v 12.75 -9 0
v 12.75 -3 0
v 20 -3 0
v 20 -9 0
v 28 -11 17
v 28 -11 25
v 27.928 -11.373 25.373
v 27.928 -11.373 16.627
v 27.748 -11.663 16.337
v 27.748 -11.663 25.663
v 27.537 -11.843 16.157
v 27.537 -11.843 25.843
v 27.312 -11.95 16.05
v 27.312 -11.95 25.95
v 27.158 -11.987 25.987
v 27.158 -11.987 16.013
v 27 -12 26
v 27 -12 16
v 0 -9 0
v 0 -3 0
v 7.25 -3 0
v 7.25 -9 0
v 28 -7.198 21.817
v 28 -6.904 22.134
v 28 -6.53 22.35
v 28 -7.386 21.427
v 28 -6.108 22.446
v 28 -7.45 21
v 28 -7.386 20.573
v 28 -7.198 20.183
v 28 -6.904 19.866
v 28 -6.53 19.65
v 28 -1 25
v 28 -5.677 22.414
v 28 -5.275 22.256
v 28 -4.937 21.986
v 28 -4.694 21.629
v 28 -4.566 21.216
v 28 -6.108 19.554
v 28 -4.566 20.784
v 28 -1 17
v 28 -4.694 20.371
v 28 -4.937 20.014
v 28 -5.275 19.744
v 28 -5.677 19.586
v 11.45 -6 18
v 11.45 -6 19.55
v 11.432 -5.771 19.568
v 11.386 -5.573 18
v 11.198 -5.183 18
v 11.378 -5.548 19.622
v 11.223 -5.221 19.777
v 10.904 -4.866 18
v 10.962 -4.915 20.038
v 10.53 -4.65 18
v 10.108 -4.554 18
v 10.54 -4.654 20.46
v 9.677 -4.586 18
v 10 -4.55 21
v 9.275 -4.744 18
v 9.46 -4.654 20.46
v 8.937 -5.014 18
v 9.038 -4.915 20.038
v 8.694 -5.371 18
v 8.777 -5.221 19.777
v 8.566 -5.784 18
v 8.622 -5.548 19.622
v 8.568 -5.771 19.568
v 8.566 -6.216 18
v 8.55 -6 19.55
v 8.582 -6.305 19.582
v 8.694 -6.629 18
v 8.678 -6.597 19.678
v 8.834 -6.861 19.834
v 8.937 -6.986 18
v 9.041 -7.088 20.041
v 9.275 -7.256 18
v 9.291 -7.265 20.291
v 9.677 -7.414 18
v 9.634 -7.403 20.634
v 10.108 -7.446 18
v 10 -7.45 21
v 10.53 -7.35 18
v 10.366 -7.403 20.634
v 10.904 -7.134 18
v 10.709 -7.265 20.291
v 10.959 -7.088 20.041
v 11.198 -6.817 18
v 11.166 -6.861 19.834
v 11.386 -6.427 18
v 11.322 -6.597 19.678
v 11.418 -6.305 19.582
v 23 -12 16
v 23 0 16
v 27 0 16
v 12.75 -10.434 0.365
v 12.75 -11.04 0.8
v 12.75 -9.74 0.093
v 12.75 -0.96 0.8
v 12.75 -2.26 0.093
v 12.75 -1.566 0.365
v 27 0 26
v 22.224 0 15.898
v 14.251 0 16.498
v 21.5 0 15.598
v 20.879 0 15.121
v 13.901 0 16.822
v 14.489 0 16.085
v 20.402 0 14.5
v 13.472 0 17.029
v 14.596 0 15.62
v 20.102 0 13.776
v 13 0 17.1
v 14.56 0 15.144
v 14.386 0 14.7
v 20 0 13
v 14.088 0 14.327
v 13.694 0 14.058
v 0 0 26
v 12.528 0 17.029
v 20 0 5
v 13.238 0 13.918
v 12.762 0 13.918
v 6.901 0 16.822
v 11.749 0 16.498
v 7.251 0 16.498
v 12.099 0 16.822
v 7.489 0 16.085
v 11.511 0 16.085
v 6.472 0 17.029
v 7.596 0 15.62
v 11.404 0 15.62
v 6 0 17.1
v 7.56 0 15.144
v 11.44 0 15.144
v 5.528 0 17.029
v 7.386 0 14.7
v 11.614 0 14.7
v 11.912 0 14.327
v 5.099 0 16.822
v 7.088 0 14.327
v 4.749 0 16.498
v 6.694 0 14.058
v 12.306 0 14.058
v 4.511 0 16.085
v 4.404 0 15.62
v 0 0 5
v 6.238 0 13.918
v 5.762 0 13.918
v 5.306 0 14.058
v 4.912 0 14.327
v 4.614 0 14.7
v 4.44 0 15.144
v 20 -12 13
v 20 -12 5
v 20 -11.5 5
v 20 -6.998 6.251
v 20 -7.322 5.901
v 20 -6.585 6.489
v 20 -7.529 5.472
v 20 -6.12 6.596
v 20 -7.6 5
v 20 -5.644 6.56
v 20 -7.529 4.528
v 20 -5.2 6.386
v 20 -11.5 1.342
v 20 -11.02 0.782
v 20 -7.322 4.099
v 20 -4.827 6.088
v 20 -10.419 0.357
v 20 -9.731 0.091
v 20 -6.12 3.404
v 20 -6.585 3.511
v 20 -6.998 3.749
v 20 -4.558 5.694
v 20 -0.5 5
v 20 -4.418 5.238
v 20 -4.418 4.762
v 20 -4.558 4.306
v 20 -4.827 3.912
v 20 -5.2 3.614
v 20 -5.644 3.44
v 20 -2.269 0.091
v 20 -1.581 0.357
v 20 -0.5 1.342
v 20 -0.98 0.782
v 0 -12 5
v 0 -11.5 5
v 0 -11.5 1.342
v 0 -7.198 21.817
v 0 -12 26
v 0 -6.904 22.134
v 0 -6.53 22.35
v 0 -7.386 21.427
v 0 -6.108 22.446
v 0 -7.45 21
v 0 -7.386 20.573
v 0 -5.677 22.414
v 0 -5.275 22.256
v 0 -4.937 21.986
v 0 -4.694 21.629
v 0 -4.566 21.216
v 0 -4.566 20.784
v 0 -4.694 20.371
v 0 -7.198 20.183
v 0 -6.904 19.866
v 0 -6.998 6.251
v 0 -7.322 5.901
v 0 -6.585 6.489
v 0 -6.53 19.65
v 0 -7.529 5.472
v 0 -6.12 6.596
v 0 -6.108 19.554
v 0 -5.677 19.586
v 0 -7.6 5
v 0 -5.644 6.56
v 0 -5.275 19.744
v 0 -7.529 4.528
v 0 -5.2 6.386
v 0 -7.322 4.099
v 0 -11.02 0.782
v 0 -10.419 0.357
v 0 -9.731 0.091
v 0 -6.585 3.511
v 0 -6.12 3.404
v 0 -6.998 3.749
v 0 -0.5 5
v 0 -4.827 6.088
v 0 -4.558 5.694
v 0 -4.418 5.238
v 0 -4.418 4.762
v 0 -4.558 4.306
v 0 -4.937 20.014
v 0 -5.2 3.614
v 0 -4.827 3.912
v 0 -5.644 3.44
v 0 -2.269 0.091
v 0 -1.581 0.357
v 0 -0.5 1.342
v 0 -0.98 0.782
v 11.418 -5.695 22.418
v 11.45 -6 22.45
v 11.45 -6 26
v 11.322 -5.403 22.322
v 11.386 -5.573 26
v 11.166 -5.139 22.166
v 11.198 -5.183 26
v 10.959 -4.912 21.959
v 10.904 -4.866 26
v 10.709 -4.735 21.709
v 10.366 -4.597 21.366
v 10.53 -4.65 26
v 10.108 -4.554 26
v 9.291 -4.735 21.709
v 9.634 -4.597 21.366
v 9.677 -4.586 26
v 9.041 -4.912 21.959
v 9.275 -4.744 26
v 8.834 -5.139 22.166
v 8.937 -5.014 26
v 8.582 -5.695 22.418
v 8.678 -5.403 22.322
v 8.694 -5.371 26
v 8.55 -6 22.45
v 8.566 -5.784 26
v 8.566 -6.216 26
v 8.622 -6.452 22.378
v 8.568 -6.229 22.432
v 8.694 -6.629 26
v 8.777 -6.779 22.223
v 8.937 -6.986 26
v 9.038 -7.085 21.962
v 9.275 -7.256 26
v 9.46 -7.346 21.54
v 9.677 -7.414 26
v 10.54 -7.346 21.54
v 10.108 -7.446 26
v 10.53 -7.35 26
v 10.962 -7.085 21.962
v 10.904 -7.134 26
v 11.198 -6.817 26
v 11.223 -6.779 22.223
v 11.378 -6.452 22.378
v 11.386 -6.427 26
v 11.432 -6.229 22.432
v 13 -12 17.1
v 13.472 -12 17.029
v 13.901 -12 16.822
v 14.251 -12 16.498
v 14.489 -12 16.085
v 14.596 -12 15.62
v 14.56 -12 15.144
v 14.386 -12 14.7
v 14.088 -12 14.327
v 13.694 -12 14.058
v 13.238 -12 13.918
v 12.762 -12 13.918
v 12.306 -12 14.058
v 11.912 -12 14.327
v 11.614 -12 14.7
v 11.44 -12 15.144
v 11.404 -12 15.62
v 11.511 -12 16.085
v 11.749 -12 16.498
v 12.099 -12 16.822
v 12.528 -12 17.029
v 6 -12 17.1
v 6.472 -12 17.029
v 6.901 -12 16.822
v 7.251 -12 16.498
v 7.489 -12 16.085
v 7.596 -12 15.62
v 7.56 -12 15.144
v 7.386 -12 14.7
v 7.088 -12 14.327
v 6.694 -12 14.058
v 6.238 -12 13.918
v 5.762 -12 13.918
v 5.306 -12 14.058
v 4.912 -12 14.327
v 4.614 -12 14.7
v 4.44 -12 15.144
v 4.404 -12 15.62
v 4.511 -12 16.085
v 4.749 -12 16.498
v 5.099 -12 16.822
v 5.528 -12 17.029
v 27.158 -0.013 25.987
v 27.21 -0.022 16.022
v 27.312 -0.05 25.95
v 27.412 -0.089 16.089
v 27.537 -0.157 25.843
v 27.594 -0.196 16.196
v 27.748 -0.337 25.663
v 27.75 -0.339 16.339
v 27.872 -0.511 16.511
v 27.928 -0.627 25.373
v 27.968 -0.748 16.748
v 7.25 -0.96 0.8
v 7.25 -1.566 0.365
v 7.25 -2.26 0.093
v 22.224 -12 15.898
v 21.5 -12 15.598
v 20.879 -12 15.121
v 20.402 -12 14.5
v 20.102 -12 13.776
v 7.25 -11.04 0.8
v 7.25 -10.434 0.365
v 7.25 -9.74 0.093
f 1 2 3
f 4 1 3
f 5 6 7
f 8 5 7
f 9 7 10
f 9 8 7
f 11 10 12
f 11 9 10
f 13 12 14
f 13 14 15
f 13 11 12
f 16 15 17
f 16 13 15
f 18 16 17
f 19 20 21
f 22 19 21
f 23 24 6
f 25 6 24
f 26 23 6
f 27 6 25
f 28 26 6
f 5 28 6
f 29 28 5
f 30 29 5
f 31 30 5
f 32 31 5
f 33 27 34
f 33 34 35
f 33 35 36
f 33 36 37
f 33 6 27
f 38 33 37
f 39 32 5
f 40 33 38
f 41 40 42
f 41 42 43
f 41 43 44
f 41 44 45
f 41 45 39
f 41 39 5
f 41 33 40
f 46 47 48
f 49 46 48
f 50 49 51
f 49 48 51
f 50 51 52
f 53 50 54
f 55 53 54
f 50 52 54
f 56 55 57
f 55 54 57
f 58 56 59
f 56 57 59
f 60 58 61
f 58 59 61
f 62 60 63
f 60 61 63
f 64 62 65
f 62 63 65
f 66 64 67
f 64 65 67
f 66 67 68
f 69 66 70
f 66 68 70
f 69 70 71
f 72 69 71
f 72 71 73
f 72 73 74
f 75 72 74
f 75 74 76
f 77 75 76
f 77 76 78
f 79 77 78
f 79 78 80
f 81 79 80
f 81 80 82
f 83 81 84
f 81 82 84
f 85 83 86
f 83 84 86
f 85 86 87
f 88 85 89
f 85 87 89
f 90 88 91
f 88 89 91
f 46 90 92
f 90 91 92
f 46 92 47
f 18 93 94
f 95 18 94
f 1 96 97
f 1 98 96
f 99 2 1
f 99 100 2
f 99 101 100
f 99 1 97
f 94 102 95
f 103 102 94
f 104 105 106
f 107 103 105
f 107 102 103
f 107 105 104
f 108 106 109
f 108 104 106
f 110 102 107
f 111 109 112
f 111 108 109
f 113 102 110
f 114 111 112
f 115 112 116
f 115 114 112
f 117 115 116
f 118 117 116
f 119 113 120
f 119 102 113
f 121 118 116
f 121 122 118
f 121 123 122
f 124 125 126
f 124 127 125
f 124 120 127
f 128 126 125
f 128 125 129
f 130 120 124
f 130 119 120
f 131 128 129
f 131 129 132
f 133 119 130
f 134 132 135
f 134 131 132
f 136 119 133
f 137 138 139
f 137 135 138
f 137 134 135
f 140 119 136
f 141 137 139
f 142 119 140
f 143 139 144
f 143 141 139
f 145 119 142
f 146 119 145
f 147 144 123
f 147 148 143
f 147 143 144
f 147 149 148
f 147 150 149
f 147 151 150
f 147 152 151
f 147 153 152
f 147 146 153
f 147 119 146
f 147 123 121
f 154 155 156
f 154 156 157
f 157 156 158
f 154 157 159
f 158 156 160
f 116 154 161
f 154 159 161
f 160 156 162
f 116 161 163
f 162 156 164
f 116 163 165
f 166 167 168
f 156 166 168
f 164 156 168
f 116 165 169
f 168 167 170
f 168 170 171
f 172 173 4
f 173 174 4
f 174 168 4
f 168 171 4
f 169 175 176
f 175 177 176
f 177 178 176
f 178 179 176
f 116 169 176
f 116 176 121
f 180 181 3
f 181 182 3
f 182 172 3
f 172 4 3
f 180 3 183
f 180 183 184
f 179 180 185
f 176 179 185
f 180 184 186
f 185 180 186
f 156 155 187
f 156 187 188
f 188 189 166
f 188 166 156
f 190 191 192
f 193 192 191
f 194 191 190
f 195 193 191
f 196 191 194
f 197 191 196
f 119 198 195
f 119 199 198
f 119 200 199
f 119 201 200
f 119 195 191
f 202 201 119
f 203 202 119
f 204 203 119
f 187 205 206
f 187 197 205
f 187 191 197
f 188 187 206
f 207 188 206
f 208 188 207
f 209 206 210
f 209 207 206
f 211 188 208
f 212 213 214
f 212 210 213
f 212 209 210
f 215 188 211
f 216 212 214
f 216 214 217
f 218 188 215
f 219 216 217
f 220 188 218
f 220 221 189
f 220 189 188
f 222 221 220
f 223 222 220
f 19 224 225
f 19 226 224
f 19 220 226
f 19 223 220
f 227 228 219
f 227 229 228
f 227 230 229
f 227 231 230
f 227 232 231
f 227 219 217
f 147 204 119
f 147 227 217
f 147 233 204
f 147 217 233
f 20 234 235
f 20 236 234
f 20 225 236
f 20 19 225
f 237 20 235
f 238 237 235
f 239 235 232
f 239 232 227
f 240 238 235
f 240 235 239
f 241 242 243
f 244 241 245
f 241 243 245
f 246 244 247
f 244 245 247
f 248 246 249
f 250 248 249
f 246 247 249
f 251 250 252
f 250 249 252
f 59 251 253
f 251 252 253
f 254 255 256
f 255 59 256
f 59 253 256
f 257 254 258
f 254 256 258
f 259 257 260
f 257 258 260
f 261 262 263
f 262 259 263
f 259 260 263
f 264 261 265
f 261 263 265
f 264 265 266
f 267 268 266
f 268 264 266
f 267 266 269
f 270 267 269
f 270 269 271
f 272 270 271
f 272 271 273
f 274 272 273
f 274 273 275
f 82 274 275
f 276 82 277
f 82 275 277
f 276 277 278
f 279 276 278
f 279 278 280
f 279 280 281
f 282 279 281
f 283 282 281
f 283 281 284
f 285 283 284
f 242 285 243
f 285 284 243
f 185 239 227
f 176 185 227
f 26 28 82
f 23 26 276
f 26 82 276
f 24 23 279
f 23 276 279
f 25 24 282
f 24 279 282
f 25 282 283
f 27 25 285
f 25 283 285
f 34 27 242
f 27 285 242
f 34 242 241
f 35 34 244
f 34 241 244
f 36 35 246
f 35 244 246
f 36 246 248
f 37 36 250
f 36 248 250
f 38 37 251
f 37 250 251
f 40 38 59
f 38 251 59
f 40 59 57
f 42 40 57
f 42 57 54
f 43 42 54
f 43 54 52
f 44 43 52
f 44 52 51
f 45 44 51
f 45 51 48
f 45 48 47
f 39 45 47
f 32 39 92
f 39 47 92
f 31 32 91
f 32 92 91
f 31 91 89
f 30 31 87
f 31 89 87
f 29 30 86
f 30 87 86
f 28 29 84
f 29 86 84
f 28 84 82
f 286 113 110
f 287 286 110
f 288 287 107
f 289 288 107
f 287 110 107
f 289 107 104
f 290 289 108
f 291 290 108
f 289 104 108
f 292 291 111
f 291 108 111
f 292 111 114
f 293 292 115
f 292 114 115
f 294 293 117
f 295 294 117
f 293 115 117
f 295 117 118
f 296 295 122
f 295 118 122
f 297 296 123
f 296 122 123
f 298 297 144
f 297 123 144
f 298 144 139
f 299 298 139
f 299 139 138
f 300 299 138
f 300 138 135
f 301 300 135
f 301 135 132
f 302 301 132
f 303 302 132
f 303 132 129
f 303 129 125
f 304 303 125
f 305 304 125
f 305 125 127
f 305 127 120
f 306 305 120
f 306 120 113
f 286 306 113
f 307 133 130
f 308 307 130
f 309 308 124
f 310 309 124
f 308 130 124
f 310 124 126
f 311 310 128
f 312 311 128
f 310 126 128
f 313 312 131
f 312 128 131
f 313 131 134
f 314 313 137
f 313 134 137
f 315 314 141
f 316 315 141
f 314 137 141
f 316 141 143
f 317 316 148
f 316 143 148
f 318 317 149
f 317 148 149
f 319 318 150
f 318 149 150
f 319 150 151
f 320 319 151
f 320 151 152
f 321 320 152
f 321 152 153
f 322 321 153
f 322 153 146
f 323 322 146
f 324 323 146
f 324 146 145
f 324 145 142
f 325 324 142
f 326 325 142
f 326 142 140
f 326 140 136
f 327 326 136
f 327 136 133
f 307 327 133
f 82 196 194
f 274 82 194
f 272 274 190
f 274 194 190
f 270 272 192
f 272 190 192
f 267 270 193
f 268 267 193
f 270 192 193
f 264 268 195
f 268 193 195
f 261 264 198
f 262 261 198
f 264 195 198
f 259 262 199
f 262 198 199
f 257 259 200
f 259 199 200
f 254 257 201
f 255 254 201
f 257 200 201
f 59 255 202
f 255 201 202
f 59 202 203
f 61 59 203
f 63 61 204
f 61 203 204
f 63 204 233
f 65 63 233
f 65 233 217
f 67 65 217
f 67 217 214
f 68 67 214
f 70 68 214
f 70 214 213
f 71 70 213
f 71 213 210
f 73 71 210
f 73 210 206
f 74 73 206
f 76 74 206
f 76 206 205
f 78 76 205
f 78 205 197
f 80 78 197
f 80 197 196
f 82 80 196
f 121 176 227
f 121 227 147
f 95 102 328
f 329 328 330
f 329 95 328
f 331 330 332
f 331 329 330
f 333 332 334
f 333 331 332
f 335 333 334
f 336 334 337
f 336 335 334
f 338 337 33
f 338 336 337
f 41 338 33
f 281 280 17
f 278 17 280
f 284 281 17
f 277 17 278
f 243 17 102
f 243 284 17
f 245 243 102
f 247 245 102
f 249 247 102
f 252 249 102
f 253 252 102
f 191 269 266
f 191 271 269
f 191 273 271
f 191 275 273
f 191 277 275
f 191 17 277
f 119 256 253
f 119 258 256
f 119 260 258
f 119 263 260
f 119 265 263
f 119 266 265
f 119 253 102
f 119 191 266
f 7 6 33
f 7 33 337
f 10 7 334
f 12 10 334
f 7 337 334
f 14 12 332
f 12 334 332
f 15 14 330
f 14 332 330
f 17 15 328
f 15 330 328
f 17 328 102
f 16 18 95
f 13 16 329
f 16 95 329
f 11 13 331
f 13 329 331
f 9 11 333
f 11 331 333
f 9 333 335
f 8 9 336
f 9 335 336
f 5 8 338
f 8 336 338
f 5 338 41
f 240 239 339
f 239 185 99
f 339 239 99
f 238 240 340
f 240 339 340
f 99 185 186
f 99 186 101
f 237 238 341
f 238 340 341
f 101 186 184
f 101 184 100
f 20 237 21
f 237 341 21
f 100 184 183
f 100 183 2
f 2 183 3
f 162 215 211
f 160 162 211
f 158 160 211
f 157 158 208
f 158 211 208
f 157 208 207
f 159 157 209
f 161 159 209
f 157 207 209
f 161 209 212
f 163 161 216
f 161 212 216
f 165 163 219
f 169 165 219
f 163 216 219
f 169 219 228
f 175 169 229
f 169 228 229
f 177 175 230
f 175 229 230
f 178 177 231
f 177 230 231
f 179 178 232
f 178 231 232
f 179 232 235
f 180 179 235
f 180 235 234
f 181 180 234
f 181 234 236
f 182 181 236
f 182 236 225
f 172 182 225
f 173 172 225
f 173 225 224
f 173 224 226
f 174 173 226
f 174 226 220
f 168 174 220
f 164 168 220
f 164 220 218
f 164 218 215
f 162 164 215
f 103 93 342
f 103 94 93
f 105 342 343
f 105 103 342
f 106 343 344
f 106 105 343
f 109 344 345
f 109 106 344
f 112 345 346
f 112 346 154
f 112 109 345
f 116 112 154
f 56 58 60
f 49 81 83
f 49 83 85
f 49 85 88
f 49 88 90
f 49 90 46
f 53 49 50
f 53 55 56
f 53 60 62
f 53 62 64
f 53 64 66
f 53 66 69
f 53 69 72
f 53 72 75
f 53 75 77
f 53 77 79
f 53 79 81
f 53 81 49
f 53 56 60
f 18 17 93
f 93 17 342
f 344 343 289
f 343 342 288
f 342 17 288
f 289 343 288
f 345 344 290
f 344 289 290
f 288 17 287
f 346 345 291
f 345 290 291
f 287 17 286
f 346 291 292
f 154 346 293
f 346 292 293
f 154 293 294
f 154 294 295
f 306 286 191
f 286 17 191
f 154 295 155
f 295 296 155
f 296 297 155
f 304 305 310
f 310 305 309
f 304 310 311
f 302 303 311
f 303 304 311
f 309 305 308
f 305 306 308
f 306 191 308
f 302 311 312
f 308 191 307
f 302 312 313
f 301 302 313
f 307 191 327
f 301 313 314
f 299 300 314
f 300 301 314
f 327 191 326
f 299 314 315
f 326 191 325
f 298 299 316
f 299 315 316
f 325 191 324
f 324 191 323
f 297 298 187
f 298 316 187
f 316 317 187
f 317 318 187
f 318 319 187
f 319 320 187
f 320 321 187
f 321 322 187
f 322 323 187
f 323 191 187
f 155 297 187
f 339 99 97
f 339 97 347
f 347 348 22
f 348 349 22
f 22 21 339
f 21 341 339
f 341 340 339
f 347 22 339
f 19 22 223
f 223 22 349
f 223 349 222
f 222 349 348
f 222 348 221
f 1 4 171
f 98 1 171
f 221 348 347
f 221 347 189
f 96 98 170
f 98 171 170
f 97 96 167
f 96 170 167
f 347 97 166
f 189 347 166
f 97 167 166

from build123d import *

# Parameters (mm, degrees)
SKETCH1_W           = 20
SKETCH1_H           = 12
BOSS_EXTRUDE1_DEPTH = 26
SKETCH2_W           = 10
SKETCH2_H           = 12
BOSS_EXTRUDE2_DEPTH = 8
SKETCH3_R           = 1.6
SKETCH3_R_2         = 1.45
CUT_EXTRUDE1_DEPTH  = 41.049968789
SKETCH4_R           = 1.6
CUT_EXTRUDE2_DEPTH  = 41.049968789
FILLET1_R           = 3
FILLET2_R           = 1
FILLET3_R           = 3
SKETCH5_W           = 9.976745634
SKETCH5_H           = 0.5
SKETCH5_W_2         = 12.25993895
CUT_EXTRUDE3_DEPTH  = 41.049968789
SKETCH6_W           = 5.5
SKETCH6_H           = 30.488056323
CUT_EXTRUDE4_DEPTH  = 0.8
SKETCH7_R           = 1.45
CUT_EXTRUDE5_DEPTH  = 8


with BuildPart() as part:
    # Sketch1 → Boss-Extrude1 (new body)
    with BuildSketch(Plane.XY):
        with Locations((10, -6)):
            Rectangle(SKETCH1_W, SKETCH1_H)
    extrude(amount=BOSS_EXTRUDE1_DEPTH)

    # Sketch2 → Boss-Extrude2 (add)
    with BuildSketch(Plane(origin=(20, 0, 0), x_dir=(0, 0, -1), z_dir=(1, 0, 0))):
        with Locations((-21, -6)):
            Rectangle(SKETCH2_W, SKETCH2_H)
    extrude(amount=BOSS_EXTRUDE2_DEPTH)

    # Sketch3 → Cut-Extrude1 (cut, through all)
    with BuildSketch(Plane.ZY):
        with Locations(Location((5, -6, 0), (0, 0, 270))):
            Circle(SKETCH3_R)
        with Locations(Location((21, -6, 0), (0, 0, 270))):
            Circle(SKETCH3_R_2)
    extrude(amount=-CUT_EXTRUDE1_DEPTH, mode=Mode.SUBTRACT)

    # Sketch4 → Cut-Extrude2 (cut, through all)
    with BuildSketch(Plane(origin=(0, 0, 0), x_dir=(1, 0, 0), z_dir=(0, 1, 0))):
        with Locations(Location((13, -15.5, 0), (0, 0, 270))):
            Circle(SKETCH4_R)
        with Locations(Location((6, -15.5, 0), (0, 0, 270))):
            Circle(SKETCH4_R)
    extrude(amount=-CUT_EXTRUDE2_DEPTH, mode=Mode.SUBTRACT)

    # Fillet1
    fillet1_edges = [part.edges().sort_by_distance(p)[0] for p in [
        (20, -6, 16),
    ]]
    fillet(fillet1_edges, radius=FILLET1_R)

    # Fillet2
    fillet2_edges = [part.edges().sort_by_distance(p)[0] for p in [
        (28, -6, 26),
        (28, -12, 21),
        (28, -6, 16),
        (28, 0, 21),
    ]]
    fillet(fillet2_edges, radius=FILLET2_R)

    # Fillet3
    fillet3_edges = [part.edges().sort_by_distance(p)[0] for p in [
        (10, 0, 0),
        (10, -12, 0),
    ]]
    fillet(fillet3_edges, radius=FILLET3_R)

    # Sketch5 → Cut-Extrude3 (cut, through all)
    with BuildSketch(Plane.ZY):
        with Locations((0.011627183, -11.75)):
            Rectangle(SKETCH5_W, SKETCH5_H)
        with Locations((-1.129969475, -0.25)):
            Rectangle(SKETCH5_W_2, SKETCH5_H)
    extrude(amount=-CUT_EXTRUDE3_DEPTH, mode=Mode.SUBTRACT)

    # Sketch6 → Cut-Extrude4 (cut)
    with BuildSketch(Plane(origin=(0, 0, 0), x_dir=(-1, 0, 0), z_dir=(0, 0, -1))):
        with Locations((-10, -7.868232937)):
            Rectangle(SKETCH6_W, SKETCH6_H)
    extrude(amount=-CUT_EXTRUDE4_DEPTH, mode=Mode.SUBTRACT)

    # Sketch7 → Cut-Extrude5 (cut)
    with BuildSketch(Plane.XY.offset(26)):
        with Locations((10, -6)):
            Circle(SKETCH7_R)
    extrude(amount=-CUT_EXTRUDE5_DEPTH, mode=Mode.SUBTRACT)


solid = part.part
